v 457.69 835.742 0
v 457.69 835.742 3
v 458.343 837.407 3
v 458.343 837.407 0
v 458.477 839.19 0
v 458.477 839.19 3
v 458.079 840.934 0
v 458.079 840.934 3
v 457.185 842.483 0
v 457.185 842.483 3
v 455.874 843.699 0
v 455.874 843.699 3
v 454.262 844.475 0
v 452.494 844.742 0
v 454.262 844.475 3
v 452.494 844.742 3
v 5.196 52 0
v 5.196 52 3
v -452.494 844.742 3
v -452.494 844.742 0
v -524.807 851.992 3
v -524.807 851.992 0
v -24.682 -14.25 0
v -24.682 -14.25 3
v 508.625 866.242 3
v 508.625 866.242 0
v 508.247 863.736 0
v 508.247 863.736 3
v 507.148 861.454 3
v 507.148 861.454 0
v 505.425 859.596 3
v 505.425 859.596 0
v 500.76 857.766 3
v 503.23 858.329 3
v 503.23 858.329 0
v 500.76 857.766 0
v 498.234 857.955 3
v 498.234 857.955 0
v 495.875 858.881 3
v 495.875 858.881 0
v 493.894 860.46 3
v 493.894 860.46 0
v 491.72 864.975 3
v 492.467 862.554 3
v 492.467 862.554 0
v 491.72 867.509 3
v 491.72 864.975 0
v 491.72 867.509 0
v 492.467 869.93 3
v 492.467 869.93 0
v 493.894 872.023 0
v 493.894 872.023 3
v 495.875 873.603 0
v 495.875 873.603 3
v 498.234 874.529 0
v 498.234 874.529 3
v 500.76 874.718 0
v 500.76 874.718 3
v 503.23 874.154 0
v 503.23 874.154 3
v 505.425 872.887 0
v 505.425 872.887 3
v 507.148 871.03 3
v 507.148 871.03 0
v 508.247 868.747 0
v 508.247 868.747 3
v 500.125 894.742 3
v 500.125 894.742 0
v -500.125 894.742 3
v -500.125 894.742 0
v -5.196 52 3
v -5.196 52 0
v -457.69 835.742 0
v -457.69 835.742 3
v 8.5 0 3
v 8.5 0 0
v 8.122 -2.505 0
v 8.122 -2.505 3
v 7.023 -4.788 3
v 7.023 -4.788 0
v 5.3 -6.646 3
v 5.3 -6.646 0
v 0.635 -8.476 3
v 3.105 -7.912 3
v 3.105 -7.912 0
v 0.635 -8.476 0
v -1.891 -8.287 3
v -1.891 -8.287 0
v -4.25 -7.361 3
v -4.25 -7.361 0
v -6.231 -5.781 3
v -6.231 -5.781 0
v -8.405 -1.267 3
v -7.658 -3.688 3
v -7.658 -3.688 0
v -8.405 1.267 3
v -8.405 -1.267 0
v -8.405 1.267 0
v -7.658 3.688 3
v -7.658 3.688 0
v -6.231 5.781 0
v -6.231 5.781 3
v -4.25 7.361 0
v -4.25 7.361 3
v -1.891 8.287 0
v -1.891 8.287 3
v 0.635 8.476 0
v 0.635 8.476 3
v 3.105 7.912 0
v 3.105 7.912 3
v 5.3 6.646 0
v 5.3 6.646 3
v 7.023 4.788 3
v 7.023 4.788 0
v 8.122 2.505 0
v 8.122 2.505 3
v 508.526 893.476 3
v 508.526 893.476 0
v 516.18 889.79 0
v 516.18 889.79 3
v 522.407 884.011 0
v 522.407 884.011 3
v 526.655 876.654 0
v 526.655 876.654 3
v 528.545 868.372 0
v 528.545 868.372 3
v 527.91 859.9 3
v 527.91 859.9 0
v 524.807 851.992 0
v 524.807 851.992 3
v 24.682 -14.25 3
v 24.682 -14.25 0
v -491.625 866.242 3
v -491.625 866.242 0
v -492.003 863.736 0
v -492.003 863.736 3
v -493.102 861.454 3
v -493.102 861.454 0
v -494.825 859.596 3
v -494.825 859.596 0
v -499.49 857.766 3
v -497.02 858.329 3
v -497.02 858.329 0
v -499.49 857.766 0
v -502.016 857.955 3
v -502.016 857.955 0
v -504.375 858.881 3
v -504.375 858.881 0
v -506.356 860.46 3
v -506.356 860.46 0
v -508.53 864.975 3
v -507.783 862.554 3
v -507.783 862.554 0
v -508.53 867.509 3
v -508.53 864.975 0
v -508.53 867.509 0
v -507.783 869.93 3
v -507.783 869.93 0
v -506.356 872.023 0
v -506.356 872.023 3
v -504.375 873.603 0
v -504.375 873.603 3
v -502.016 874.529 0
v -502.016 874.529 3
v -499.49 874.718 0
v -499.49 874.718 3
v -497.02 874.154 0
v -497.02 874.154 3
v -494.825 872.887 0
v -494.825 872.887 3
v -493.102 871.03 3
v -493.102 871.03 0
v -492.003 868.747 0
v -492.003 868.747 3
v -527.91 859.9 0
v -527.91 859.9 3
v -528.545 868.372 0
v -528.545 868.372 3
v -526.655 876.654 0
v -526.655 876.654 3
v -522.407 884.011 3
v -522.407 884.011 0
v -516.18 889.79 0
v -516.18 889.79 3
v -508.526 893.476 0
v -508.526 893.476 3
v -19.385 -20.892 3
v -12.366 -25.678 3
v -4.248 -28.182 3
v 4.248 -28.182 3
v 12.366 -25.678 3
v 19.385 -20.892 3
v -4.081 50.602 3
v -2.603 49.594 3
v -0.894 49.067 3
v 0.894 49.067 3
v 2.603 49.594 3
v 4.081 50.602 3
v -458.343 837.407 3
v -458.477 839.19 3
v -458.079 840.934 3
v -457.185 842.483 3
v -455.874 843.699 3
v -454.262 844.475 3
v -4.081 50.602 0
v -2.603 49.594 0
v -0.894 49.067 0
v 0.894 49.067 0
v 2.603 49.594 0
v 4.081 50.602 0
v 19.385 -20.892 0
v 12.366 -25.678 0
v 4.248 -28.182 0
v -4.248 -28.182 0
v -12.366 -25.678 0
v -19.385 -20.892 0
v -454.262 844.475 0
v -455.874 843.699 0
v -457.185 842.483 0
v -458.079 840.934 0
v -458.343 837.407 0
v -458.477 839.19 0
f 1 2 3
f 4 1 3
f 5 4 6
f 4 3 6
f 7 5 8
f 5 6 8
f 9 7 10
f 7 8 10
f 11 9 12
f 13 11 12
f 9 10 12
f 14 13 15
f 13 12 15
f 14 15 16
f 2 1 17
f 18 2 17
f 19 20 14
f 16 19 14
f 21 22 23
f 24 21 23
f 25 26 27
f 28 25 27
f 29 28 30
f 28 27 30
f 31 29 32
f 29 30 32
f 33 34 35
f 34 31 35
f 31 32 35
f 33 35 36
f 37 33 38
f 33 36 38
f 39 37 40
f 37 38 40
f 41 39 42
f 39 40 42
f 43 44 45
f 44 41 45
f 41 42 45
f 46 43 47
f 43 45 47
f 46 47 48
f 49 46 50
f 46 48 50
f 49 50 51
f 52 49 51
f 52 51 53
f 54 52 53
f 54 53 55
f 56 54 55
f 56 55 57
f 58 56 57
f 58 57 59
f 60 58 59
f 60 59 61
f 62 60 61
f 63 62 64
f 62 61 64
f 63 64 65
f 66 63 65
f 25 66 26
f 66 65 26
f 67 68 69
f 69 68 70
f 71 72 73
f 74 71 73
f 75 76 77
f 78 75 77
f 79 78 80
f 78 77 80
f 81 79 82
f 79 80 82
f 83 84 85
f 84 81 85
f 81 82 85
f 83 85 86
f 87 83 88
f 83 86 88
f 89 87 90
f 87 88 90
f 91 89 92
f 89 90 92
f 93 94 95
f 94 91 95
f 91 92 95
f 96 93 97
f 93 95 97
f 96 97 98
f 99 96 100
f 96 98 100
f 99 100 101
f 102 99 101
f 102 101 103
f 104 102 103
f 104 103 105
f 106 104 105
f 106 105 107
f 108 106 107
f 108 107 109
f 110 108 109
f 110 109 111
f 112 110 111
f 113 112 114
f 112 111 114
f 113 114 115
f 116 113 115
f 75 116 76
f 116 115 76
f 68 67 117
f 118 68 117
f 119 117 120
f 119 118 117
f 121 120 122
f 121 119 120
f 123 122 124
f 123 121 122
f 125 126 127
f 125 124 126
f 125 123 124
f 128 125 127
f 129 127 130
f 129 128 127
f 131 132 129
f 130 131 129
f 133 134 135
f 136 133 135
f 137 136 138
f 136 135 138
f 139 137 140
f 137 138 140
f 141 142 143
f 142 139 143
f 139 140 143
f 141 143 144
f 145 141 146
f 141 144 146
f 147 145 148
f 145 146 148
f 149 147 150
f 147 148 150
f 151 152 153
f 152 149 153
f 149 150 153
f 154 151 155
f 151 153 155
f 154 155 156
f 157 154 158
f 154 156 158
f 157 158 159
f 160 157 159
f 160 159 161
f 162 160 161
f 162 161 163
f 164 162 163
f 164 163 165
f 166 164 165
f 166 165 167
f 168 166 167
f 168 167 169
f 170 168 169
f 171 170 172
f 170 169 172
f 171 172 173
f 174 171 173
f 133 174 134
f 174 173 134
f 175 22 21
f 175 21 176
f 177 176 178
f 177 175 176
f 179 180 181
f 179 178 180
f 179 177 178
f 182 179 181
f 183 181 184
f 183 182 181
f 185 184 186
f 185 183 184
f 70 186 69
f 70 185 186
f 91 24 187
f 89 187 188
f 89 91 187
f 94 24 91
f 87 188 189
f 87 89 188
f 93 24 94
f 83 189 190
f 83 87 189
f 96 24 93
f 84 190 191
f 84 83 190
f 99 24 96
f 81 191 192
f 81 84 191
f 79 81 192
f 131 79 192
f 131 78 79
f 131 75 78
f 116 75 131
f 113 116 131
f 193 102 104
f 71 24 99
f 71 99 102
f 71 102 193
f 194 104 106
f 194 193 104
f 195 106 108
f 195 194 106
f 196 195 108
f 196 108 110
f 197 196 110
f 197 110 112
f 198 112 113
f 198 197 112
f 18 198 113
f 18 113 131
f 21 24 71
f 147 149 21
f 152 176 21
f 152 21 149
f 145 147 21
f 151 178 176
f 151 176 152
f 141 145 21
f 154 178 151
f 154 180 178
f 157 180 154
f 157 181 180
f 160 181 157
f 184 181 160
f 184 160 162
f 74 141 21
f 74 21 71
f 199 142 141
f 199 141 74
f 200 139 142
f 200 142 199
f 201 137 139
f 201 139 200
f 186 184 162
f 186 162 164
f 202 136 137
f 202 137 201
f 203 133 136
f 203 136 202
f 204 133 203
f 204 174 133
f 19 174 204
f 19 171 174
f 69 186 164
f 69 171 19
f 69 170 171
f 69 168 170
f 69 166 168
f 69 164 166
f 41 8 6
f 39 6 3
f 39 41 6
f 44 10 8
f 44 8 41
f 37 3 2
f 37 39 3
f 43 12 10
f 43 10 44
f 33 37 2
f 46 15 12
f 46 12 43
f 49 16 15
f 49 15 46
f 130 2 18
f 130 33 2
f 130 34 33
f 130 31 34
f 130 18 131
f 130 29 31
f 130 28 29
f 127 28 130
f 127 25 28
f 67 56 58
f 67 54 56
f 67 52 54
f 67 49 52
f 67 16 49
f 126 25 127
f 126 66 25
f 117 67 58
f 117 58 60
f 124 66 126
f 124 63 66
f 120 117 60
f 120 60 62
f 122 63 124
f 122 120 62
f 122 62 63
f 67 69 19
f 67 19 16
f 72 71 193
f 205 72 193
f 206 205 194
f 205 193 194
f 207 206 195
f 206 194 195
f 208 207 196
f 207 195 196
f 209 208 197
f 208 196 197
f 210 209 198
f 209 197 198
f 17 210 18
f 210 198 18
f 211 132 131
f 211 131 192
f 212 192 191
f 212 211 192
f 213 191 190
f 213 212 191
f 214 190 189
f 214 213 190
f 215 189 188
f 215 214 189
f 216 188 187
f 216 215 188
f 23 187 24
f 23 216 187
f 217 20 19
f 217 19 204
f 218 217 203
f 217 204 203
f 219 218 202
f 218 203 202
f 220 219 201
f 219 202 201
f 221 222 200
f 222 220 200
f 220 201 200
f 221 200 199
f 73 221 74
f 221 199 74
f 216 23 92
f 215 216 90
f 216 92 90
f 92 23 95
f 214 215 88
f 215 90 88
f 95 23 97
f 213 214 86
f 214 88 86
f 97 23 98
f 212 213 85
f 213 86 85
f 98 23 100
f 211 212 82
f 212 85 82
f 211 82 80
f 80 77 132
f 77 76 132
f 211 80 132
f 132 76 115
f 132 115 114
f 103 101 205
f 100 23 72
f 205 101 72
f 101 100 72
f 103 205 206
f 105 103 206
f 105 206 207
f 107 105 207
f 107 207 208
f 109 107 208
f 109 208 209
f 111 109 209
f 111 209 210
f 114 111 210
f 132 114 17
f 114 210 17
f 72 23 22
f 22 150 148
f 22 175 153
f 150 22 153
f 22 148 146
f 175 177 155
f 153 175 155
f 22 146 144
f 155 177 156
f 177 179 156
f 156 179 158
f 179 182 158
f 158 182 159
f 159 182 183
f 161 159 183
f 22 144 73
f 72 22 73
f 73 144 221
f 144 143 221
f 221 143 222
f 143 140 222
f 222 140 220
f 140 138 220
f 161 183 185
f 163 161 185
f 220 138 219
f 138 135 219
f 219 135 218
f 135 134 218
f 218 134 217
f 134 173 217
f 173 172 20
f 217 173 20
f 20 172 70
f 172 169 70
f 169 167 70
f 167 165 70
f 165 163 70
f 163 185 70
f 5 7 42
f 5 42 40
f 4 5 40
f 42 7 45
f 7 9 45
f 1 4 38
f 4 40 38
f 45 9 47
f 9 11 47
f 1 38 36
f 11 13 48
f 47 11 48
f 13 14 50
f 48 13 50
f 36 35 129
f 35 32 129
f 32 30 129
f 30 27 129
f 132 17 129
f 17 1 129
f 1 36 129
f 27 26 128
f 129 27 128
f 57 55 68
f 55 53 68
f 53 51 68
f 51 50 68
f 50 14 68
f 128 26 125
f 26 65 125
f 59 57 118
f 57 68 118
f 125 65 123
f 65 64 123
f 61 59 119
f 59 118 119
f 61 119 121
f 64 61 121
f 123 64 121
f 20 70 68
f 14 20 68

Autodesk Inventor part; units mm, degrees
ref_plane "YZ Plane" through (0, 0, 0) normal (1, 0, 0) x (0, 1, 0)
ref_plane "XZ Plane" through (0, 0, 0) normal (0, 1, 0) x (-1, 0, 0)
ref_plane "XY Plane" through (0, 0, 0) normal (0, 0, 1) x (1, 0, 0)
sketch "Sketch1" plane through (0, 0, 0) normal (0, 0, 1) x (1, 0, 0)
  circle A0 centre (0, 0) radius 8.5
  line L0 (-524.8067, 851.9919) -> (-24.6817, -14.25)
  arc A1 (-24.6817, -14.25) -> (24.6817, -14.25) centre (0, 0) ccw
  line L1 (24.6817, -14.25) -> (524.8067, 851.9919)
  arc A2 (524.8067, 851.9919) -> (500.125, 894.7419) centre (500.125, 866.2419) ccw
  line L2 (500.125, 894.7419) -> (-500.125, 894.7419)
  arc A3 (-500.125, 894.7419) -> (-524.8067, 851.9919) centre (-500.125, 866.2419) ccw
  line L3 (0, 0) -> (0, 894.7419) construction
  line L4 (-462.8859, 844.7419) -> (462.8859, 844.7419)
  line L5 (462.8859, 844.7419) -> (0, 43)
  line L6 (0, 43) -> (-462.8859, 844.7419)
  circle A4 centre (-500.125, 866.2419) radius 8.5
  circle A5 centre (500.125, 866.2419) radius 8.5
  dimension "d34" = 17
  dimension "d35" = 20
  dimension "d36" = 1000.25
  dimension "d37" = 1000.25
  dimension "d38" = 50
  dimension "d39" = 17
  dimension "d40" = 17
extrude "Plate1" add sketch "Sketch1" along normal blind 3
fillet "Corner Round3" radius 6 3 edges at (-462.8859, 844.7419, 1.5) (0, 43, 1.5) (462.8859, 844.7419, 1.5)
equation "\"d37\" = d36"
equation "\"d2\" = Thickness"
equation "\"BendReliefWidth\" = Thickness"
equation "\"BendReliefDepth\" = 0.5 * Thickness"
equation "\"CornerReliefSize\" = 4 * Thickness"
equation "\"MinimumRemnant\" = 2 * Thickness"
equation "\"TransitionRadius\" = BendRadius"
equation "\"JacobiRadiusSize\" = BendRadius"
equation "\"GapSize\" = Thickness"
equation "\"Thickness\" = 3"
equation "\"BendRadius\" = 5"
properties part number "TZS 1289 leg pattern" material "Stainless Steel"
